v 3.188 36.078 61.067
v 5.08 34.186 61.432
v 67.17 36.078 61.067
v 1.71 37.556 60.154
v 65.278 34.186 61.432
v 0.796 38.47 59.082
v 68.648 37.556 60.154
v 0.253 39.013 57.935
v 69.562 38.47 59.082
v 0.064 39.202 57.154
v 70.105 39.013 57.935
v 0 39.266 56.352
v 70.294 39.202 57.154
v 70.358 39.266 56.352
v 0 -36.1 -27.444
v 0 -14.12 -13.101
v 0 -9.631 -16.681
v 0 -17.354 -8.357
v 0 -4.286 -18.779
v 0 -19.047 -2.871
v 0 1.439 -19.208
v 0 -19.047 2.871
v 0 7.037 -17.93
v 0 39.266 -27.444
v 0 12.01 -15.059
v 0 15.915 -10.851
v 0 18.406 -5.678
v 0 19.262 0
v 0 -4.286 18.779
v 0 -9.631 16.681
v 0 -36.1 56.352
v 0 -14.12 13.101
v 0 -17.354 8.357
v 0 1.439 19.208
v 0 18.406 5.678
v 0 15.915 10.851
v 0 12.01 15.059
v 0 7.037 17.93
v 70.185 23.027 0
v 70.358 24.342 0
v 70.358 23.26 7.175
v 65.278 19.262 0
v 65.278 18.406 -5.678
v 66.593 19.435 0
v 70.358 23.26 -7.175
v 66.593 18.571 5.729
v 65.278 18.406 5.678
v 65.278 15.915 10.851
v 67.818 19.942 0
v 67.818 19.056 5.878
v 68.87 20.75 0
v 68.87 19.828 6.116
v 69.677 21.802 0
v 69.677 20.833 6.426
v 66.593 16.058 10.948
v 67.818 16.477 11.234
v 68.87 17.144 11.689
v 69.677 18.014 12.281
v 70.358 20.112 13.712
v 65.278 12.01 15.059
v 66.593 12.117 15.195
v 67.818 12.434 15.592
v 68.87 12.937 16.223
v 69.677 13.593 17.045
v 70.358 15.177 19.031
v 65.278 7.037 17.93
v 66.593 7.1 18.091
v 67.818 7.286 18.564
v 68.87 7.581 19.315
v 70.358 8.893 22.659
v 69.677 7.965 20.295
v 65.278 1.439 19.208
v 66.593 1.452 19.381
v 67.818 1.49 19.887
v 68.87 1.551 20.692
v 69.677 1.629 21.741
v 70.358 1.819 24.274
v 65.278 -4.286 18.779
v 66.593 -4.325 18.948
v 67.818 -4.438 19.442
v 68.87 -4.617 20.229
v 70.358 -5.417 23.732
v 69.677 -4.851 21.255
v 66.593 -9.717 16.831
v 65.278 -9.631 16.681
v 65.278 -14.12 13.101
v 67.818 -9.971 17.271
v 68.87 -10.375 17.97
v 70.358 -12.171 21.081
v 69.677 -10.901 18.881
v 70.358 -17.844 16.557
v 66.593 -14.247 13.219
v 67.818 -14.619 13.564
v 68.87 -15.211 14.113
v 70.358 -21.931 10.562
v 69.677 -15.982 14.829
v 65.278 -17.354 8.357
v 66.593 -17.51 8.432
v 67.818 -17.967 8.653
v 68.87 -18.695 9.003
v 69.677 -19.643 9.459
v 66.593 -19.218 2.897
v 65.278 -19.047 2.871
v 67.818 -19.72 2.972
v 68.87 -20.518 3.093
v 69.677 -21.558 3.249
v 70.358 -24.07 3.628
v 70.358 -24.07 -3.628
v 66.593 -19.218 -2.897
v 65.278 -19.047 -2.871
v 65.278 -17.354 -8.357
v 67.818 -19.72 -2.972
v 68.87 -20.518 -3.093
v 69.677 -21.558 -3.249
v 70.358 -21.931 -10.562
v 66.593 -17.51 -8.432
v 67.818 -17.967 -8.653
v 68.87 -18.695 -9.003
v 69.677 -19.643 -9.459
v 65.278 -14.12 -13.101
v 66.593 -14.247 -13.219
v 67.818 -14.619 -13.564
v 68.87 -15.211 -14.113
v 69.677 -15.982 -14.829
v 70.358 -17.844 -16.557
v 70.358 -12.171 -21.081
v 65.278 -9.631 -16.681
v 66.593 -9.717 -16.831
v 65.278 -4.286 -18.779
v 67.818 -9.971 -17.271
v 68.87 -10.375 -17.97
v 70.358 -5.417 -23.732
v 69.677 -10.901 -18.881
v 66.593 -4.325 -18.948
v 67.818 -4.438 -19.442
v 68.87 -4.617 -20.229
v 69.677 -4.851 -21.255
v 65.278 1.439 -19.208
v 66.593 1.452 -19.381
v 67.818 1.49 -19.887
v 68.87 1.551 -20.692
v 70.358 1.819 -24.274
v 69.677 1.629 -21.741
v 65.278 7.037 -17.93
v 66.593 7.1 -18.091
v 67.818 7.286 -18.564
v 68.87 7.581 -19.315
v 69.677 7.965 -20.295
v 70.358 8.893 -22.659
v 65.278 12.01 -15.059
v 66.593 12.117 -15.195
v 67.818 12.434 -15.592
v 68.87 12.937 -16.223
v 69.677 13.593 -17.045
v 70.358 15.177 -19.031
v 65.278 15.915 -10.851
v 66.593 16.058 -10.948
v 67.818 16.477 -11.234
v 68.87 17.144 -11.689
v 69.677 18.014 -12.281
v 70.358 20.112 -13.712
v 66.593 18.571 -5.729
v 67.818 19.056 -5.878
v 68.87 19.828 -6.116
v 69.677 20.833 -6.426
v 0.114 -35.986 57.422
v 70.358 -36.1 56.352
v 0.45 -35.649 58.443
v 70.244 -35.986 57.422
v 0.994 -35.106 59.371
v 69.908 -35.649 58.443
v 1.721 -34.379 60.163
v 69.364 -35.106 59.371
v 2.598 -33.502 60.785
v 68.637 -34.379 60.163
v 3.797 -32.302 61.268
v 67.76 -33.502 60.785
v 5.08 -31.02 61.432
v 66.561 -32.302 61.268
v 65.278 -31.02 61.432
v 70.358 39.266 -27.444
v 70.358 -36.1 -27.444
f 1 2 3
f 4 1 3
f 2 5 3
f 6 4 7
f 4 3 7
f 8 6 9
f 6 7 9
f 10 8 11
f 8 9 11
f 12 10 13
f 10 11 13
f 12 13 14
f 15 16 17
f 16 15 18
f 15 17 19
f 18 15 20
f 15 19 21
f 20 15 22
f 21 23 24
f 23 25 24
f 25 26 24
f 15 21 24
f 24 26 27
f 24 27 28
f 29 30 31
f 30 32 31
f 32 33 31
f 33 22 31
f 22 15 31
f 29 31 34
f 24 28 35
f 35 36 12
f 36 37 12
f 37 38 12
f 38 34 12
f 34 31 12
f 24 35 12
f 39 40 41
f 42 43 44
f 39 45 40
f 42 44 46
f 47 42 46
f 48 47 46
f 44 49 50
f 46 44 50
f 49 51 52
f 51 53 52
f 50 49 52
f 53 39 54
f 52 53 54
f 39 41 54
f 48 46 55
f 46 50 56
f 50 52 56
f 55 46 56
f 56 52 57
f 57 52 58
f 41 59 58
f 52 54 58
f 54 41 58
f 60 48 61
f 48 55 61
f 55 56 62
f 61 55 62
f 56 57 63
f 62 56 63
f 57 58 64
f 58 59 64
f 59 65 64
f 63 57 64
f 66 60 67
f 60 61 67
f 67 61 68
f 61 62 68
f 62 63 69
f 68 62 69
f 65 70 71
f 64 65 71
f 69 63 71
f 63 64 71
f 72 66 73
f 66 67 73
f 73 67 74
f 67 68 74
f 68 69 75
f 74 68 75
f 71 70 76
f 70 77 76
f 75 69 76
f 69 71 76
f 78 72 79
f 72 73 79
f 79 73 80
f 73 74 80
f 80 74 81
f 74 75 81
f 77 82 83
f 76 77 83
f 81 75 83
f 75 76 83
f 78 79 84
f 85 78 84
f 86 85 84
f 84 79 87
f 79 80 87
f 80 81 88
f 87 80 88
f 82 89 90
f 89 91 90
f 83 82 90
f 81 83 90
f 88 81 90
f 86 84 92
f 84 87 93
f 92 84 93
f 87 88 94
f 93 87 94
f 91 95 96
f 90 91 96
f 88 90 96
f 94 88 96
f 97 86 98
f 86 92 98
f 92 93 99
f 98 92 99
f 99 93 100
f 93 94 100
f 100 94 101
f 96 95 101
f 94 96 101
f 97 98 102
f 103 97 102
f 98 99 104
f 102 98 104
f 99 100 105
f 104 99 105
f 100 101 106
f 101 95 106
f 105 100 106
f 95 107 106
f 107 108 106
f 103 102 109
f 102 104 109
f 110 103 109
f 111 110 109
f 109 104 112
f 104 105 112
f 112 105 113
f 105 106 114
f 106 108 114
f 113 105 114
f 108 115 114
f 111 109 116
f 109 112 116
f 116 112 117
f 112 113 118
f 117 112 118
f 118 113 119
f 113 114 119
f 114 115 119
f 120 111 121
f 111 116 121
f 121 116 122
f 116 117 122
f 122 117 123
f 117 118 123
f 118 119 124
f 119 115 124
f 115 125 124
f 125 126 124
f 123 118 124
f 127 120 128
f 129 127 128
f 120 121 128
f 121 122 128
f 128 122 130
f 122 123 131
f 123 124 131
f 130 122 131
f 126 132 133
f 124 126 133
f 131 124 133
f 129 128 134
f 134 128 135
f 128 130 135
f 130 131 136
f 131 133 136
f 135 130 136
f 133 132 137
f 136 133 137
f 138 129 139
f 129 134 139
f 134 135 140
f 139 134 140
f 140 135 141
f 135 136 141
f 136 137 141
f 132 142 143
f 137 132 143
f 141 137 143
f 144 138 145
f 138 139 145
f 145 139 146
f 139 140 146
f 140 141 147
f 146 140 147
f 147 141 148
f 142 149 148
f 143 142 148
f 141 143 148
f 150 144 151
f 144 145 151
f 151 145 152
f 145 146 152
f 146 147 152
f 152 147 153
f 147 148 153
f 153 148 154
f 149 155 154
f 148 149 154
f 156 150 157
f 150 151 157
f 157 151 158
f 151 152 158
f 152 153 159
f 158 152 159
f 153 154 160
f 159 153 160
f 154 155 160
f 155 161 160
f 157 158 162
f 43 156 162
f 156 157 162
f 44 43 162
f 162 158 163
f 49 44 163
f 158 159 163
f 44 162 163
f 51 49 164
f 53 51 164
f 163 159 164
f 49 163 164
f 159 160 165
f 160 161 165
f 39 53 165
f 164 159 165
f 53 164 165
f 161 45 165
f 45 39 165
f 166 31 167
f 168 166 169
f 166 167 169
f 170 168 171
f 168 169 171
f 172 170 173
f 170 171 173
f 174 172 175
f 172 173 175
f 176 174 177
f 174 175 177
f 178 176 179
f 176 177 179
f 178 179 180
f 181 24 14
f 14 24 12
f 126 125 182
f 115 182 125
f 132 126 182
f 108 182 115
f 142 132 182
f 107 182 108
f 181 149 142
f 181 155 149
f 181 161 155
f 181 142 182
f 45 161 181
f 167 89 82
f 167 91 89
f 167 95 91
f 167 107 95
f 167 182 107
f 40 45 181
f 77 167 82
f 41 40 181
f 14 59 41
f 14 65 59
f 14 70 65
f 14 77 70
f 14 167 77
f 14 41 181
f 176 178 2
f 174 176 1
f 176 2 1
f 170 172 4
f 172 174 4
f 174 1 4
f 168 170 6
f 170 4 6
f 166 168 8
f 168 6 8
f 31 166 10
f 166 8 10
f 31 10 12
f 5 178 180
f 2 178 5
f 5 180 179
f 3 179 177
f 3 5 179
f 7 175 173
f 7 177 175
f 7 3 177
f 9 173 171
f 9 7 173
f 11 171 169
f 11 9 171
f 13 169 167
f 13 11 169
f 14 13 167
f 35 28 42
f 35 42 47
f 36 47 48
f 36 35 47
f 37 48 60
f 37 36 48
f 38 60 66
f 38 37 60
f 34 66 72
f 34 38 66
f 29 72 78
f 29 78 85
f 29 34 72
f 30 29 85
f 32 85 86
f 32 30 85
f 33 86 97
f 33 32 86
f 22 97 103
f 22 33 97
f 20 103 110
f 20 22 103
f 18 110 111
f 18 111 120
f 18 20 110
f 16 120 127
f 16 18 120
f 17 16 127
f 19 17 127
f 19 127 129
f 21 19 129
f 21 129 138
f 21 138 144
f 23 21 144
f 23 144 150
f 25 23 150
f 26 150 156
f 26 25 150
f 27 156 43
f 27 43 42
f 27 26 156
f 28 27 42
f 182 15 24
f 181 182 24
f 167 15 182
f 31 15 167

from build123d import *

# Parameters (mm, degrees)
F0_W     = 75.365622
F0_H     = 88.876544
F0_R     = 19.261813
F1_DEPTH = 70.358
F2_R     = 5.08


with BuildPart() as f1:
    # F0 (on Right) → F1 (new body)
    with BuildSketch(Plane.YZ):
        with Locations((1.58331, 16.994209)):
            Rectangle(F0_W, F0_H)
        Circle(F0_R, mode=Mode.SUBTRACT)
    extrude(amount=F1_DEPTH)

    # F2
    f2_edges = [f1.edges().sort_by_distance(p)[0] for p in [
        (35.179, -36.099501, 61.432481),
        (35.179, 39.266121, 61.432481),
        (70.358, 1.58331, 61.432481),
        (0, 1.58331, 61.432481),
        (70.358, -19.261813, 0),
    ]]
    fillet(f2_edges, radius=F2_R)


solid = f1.part
